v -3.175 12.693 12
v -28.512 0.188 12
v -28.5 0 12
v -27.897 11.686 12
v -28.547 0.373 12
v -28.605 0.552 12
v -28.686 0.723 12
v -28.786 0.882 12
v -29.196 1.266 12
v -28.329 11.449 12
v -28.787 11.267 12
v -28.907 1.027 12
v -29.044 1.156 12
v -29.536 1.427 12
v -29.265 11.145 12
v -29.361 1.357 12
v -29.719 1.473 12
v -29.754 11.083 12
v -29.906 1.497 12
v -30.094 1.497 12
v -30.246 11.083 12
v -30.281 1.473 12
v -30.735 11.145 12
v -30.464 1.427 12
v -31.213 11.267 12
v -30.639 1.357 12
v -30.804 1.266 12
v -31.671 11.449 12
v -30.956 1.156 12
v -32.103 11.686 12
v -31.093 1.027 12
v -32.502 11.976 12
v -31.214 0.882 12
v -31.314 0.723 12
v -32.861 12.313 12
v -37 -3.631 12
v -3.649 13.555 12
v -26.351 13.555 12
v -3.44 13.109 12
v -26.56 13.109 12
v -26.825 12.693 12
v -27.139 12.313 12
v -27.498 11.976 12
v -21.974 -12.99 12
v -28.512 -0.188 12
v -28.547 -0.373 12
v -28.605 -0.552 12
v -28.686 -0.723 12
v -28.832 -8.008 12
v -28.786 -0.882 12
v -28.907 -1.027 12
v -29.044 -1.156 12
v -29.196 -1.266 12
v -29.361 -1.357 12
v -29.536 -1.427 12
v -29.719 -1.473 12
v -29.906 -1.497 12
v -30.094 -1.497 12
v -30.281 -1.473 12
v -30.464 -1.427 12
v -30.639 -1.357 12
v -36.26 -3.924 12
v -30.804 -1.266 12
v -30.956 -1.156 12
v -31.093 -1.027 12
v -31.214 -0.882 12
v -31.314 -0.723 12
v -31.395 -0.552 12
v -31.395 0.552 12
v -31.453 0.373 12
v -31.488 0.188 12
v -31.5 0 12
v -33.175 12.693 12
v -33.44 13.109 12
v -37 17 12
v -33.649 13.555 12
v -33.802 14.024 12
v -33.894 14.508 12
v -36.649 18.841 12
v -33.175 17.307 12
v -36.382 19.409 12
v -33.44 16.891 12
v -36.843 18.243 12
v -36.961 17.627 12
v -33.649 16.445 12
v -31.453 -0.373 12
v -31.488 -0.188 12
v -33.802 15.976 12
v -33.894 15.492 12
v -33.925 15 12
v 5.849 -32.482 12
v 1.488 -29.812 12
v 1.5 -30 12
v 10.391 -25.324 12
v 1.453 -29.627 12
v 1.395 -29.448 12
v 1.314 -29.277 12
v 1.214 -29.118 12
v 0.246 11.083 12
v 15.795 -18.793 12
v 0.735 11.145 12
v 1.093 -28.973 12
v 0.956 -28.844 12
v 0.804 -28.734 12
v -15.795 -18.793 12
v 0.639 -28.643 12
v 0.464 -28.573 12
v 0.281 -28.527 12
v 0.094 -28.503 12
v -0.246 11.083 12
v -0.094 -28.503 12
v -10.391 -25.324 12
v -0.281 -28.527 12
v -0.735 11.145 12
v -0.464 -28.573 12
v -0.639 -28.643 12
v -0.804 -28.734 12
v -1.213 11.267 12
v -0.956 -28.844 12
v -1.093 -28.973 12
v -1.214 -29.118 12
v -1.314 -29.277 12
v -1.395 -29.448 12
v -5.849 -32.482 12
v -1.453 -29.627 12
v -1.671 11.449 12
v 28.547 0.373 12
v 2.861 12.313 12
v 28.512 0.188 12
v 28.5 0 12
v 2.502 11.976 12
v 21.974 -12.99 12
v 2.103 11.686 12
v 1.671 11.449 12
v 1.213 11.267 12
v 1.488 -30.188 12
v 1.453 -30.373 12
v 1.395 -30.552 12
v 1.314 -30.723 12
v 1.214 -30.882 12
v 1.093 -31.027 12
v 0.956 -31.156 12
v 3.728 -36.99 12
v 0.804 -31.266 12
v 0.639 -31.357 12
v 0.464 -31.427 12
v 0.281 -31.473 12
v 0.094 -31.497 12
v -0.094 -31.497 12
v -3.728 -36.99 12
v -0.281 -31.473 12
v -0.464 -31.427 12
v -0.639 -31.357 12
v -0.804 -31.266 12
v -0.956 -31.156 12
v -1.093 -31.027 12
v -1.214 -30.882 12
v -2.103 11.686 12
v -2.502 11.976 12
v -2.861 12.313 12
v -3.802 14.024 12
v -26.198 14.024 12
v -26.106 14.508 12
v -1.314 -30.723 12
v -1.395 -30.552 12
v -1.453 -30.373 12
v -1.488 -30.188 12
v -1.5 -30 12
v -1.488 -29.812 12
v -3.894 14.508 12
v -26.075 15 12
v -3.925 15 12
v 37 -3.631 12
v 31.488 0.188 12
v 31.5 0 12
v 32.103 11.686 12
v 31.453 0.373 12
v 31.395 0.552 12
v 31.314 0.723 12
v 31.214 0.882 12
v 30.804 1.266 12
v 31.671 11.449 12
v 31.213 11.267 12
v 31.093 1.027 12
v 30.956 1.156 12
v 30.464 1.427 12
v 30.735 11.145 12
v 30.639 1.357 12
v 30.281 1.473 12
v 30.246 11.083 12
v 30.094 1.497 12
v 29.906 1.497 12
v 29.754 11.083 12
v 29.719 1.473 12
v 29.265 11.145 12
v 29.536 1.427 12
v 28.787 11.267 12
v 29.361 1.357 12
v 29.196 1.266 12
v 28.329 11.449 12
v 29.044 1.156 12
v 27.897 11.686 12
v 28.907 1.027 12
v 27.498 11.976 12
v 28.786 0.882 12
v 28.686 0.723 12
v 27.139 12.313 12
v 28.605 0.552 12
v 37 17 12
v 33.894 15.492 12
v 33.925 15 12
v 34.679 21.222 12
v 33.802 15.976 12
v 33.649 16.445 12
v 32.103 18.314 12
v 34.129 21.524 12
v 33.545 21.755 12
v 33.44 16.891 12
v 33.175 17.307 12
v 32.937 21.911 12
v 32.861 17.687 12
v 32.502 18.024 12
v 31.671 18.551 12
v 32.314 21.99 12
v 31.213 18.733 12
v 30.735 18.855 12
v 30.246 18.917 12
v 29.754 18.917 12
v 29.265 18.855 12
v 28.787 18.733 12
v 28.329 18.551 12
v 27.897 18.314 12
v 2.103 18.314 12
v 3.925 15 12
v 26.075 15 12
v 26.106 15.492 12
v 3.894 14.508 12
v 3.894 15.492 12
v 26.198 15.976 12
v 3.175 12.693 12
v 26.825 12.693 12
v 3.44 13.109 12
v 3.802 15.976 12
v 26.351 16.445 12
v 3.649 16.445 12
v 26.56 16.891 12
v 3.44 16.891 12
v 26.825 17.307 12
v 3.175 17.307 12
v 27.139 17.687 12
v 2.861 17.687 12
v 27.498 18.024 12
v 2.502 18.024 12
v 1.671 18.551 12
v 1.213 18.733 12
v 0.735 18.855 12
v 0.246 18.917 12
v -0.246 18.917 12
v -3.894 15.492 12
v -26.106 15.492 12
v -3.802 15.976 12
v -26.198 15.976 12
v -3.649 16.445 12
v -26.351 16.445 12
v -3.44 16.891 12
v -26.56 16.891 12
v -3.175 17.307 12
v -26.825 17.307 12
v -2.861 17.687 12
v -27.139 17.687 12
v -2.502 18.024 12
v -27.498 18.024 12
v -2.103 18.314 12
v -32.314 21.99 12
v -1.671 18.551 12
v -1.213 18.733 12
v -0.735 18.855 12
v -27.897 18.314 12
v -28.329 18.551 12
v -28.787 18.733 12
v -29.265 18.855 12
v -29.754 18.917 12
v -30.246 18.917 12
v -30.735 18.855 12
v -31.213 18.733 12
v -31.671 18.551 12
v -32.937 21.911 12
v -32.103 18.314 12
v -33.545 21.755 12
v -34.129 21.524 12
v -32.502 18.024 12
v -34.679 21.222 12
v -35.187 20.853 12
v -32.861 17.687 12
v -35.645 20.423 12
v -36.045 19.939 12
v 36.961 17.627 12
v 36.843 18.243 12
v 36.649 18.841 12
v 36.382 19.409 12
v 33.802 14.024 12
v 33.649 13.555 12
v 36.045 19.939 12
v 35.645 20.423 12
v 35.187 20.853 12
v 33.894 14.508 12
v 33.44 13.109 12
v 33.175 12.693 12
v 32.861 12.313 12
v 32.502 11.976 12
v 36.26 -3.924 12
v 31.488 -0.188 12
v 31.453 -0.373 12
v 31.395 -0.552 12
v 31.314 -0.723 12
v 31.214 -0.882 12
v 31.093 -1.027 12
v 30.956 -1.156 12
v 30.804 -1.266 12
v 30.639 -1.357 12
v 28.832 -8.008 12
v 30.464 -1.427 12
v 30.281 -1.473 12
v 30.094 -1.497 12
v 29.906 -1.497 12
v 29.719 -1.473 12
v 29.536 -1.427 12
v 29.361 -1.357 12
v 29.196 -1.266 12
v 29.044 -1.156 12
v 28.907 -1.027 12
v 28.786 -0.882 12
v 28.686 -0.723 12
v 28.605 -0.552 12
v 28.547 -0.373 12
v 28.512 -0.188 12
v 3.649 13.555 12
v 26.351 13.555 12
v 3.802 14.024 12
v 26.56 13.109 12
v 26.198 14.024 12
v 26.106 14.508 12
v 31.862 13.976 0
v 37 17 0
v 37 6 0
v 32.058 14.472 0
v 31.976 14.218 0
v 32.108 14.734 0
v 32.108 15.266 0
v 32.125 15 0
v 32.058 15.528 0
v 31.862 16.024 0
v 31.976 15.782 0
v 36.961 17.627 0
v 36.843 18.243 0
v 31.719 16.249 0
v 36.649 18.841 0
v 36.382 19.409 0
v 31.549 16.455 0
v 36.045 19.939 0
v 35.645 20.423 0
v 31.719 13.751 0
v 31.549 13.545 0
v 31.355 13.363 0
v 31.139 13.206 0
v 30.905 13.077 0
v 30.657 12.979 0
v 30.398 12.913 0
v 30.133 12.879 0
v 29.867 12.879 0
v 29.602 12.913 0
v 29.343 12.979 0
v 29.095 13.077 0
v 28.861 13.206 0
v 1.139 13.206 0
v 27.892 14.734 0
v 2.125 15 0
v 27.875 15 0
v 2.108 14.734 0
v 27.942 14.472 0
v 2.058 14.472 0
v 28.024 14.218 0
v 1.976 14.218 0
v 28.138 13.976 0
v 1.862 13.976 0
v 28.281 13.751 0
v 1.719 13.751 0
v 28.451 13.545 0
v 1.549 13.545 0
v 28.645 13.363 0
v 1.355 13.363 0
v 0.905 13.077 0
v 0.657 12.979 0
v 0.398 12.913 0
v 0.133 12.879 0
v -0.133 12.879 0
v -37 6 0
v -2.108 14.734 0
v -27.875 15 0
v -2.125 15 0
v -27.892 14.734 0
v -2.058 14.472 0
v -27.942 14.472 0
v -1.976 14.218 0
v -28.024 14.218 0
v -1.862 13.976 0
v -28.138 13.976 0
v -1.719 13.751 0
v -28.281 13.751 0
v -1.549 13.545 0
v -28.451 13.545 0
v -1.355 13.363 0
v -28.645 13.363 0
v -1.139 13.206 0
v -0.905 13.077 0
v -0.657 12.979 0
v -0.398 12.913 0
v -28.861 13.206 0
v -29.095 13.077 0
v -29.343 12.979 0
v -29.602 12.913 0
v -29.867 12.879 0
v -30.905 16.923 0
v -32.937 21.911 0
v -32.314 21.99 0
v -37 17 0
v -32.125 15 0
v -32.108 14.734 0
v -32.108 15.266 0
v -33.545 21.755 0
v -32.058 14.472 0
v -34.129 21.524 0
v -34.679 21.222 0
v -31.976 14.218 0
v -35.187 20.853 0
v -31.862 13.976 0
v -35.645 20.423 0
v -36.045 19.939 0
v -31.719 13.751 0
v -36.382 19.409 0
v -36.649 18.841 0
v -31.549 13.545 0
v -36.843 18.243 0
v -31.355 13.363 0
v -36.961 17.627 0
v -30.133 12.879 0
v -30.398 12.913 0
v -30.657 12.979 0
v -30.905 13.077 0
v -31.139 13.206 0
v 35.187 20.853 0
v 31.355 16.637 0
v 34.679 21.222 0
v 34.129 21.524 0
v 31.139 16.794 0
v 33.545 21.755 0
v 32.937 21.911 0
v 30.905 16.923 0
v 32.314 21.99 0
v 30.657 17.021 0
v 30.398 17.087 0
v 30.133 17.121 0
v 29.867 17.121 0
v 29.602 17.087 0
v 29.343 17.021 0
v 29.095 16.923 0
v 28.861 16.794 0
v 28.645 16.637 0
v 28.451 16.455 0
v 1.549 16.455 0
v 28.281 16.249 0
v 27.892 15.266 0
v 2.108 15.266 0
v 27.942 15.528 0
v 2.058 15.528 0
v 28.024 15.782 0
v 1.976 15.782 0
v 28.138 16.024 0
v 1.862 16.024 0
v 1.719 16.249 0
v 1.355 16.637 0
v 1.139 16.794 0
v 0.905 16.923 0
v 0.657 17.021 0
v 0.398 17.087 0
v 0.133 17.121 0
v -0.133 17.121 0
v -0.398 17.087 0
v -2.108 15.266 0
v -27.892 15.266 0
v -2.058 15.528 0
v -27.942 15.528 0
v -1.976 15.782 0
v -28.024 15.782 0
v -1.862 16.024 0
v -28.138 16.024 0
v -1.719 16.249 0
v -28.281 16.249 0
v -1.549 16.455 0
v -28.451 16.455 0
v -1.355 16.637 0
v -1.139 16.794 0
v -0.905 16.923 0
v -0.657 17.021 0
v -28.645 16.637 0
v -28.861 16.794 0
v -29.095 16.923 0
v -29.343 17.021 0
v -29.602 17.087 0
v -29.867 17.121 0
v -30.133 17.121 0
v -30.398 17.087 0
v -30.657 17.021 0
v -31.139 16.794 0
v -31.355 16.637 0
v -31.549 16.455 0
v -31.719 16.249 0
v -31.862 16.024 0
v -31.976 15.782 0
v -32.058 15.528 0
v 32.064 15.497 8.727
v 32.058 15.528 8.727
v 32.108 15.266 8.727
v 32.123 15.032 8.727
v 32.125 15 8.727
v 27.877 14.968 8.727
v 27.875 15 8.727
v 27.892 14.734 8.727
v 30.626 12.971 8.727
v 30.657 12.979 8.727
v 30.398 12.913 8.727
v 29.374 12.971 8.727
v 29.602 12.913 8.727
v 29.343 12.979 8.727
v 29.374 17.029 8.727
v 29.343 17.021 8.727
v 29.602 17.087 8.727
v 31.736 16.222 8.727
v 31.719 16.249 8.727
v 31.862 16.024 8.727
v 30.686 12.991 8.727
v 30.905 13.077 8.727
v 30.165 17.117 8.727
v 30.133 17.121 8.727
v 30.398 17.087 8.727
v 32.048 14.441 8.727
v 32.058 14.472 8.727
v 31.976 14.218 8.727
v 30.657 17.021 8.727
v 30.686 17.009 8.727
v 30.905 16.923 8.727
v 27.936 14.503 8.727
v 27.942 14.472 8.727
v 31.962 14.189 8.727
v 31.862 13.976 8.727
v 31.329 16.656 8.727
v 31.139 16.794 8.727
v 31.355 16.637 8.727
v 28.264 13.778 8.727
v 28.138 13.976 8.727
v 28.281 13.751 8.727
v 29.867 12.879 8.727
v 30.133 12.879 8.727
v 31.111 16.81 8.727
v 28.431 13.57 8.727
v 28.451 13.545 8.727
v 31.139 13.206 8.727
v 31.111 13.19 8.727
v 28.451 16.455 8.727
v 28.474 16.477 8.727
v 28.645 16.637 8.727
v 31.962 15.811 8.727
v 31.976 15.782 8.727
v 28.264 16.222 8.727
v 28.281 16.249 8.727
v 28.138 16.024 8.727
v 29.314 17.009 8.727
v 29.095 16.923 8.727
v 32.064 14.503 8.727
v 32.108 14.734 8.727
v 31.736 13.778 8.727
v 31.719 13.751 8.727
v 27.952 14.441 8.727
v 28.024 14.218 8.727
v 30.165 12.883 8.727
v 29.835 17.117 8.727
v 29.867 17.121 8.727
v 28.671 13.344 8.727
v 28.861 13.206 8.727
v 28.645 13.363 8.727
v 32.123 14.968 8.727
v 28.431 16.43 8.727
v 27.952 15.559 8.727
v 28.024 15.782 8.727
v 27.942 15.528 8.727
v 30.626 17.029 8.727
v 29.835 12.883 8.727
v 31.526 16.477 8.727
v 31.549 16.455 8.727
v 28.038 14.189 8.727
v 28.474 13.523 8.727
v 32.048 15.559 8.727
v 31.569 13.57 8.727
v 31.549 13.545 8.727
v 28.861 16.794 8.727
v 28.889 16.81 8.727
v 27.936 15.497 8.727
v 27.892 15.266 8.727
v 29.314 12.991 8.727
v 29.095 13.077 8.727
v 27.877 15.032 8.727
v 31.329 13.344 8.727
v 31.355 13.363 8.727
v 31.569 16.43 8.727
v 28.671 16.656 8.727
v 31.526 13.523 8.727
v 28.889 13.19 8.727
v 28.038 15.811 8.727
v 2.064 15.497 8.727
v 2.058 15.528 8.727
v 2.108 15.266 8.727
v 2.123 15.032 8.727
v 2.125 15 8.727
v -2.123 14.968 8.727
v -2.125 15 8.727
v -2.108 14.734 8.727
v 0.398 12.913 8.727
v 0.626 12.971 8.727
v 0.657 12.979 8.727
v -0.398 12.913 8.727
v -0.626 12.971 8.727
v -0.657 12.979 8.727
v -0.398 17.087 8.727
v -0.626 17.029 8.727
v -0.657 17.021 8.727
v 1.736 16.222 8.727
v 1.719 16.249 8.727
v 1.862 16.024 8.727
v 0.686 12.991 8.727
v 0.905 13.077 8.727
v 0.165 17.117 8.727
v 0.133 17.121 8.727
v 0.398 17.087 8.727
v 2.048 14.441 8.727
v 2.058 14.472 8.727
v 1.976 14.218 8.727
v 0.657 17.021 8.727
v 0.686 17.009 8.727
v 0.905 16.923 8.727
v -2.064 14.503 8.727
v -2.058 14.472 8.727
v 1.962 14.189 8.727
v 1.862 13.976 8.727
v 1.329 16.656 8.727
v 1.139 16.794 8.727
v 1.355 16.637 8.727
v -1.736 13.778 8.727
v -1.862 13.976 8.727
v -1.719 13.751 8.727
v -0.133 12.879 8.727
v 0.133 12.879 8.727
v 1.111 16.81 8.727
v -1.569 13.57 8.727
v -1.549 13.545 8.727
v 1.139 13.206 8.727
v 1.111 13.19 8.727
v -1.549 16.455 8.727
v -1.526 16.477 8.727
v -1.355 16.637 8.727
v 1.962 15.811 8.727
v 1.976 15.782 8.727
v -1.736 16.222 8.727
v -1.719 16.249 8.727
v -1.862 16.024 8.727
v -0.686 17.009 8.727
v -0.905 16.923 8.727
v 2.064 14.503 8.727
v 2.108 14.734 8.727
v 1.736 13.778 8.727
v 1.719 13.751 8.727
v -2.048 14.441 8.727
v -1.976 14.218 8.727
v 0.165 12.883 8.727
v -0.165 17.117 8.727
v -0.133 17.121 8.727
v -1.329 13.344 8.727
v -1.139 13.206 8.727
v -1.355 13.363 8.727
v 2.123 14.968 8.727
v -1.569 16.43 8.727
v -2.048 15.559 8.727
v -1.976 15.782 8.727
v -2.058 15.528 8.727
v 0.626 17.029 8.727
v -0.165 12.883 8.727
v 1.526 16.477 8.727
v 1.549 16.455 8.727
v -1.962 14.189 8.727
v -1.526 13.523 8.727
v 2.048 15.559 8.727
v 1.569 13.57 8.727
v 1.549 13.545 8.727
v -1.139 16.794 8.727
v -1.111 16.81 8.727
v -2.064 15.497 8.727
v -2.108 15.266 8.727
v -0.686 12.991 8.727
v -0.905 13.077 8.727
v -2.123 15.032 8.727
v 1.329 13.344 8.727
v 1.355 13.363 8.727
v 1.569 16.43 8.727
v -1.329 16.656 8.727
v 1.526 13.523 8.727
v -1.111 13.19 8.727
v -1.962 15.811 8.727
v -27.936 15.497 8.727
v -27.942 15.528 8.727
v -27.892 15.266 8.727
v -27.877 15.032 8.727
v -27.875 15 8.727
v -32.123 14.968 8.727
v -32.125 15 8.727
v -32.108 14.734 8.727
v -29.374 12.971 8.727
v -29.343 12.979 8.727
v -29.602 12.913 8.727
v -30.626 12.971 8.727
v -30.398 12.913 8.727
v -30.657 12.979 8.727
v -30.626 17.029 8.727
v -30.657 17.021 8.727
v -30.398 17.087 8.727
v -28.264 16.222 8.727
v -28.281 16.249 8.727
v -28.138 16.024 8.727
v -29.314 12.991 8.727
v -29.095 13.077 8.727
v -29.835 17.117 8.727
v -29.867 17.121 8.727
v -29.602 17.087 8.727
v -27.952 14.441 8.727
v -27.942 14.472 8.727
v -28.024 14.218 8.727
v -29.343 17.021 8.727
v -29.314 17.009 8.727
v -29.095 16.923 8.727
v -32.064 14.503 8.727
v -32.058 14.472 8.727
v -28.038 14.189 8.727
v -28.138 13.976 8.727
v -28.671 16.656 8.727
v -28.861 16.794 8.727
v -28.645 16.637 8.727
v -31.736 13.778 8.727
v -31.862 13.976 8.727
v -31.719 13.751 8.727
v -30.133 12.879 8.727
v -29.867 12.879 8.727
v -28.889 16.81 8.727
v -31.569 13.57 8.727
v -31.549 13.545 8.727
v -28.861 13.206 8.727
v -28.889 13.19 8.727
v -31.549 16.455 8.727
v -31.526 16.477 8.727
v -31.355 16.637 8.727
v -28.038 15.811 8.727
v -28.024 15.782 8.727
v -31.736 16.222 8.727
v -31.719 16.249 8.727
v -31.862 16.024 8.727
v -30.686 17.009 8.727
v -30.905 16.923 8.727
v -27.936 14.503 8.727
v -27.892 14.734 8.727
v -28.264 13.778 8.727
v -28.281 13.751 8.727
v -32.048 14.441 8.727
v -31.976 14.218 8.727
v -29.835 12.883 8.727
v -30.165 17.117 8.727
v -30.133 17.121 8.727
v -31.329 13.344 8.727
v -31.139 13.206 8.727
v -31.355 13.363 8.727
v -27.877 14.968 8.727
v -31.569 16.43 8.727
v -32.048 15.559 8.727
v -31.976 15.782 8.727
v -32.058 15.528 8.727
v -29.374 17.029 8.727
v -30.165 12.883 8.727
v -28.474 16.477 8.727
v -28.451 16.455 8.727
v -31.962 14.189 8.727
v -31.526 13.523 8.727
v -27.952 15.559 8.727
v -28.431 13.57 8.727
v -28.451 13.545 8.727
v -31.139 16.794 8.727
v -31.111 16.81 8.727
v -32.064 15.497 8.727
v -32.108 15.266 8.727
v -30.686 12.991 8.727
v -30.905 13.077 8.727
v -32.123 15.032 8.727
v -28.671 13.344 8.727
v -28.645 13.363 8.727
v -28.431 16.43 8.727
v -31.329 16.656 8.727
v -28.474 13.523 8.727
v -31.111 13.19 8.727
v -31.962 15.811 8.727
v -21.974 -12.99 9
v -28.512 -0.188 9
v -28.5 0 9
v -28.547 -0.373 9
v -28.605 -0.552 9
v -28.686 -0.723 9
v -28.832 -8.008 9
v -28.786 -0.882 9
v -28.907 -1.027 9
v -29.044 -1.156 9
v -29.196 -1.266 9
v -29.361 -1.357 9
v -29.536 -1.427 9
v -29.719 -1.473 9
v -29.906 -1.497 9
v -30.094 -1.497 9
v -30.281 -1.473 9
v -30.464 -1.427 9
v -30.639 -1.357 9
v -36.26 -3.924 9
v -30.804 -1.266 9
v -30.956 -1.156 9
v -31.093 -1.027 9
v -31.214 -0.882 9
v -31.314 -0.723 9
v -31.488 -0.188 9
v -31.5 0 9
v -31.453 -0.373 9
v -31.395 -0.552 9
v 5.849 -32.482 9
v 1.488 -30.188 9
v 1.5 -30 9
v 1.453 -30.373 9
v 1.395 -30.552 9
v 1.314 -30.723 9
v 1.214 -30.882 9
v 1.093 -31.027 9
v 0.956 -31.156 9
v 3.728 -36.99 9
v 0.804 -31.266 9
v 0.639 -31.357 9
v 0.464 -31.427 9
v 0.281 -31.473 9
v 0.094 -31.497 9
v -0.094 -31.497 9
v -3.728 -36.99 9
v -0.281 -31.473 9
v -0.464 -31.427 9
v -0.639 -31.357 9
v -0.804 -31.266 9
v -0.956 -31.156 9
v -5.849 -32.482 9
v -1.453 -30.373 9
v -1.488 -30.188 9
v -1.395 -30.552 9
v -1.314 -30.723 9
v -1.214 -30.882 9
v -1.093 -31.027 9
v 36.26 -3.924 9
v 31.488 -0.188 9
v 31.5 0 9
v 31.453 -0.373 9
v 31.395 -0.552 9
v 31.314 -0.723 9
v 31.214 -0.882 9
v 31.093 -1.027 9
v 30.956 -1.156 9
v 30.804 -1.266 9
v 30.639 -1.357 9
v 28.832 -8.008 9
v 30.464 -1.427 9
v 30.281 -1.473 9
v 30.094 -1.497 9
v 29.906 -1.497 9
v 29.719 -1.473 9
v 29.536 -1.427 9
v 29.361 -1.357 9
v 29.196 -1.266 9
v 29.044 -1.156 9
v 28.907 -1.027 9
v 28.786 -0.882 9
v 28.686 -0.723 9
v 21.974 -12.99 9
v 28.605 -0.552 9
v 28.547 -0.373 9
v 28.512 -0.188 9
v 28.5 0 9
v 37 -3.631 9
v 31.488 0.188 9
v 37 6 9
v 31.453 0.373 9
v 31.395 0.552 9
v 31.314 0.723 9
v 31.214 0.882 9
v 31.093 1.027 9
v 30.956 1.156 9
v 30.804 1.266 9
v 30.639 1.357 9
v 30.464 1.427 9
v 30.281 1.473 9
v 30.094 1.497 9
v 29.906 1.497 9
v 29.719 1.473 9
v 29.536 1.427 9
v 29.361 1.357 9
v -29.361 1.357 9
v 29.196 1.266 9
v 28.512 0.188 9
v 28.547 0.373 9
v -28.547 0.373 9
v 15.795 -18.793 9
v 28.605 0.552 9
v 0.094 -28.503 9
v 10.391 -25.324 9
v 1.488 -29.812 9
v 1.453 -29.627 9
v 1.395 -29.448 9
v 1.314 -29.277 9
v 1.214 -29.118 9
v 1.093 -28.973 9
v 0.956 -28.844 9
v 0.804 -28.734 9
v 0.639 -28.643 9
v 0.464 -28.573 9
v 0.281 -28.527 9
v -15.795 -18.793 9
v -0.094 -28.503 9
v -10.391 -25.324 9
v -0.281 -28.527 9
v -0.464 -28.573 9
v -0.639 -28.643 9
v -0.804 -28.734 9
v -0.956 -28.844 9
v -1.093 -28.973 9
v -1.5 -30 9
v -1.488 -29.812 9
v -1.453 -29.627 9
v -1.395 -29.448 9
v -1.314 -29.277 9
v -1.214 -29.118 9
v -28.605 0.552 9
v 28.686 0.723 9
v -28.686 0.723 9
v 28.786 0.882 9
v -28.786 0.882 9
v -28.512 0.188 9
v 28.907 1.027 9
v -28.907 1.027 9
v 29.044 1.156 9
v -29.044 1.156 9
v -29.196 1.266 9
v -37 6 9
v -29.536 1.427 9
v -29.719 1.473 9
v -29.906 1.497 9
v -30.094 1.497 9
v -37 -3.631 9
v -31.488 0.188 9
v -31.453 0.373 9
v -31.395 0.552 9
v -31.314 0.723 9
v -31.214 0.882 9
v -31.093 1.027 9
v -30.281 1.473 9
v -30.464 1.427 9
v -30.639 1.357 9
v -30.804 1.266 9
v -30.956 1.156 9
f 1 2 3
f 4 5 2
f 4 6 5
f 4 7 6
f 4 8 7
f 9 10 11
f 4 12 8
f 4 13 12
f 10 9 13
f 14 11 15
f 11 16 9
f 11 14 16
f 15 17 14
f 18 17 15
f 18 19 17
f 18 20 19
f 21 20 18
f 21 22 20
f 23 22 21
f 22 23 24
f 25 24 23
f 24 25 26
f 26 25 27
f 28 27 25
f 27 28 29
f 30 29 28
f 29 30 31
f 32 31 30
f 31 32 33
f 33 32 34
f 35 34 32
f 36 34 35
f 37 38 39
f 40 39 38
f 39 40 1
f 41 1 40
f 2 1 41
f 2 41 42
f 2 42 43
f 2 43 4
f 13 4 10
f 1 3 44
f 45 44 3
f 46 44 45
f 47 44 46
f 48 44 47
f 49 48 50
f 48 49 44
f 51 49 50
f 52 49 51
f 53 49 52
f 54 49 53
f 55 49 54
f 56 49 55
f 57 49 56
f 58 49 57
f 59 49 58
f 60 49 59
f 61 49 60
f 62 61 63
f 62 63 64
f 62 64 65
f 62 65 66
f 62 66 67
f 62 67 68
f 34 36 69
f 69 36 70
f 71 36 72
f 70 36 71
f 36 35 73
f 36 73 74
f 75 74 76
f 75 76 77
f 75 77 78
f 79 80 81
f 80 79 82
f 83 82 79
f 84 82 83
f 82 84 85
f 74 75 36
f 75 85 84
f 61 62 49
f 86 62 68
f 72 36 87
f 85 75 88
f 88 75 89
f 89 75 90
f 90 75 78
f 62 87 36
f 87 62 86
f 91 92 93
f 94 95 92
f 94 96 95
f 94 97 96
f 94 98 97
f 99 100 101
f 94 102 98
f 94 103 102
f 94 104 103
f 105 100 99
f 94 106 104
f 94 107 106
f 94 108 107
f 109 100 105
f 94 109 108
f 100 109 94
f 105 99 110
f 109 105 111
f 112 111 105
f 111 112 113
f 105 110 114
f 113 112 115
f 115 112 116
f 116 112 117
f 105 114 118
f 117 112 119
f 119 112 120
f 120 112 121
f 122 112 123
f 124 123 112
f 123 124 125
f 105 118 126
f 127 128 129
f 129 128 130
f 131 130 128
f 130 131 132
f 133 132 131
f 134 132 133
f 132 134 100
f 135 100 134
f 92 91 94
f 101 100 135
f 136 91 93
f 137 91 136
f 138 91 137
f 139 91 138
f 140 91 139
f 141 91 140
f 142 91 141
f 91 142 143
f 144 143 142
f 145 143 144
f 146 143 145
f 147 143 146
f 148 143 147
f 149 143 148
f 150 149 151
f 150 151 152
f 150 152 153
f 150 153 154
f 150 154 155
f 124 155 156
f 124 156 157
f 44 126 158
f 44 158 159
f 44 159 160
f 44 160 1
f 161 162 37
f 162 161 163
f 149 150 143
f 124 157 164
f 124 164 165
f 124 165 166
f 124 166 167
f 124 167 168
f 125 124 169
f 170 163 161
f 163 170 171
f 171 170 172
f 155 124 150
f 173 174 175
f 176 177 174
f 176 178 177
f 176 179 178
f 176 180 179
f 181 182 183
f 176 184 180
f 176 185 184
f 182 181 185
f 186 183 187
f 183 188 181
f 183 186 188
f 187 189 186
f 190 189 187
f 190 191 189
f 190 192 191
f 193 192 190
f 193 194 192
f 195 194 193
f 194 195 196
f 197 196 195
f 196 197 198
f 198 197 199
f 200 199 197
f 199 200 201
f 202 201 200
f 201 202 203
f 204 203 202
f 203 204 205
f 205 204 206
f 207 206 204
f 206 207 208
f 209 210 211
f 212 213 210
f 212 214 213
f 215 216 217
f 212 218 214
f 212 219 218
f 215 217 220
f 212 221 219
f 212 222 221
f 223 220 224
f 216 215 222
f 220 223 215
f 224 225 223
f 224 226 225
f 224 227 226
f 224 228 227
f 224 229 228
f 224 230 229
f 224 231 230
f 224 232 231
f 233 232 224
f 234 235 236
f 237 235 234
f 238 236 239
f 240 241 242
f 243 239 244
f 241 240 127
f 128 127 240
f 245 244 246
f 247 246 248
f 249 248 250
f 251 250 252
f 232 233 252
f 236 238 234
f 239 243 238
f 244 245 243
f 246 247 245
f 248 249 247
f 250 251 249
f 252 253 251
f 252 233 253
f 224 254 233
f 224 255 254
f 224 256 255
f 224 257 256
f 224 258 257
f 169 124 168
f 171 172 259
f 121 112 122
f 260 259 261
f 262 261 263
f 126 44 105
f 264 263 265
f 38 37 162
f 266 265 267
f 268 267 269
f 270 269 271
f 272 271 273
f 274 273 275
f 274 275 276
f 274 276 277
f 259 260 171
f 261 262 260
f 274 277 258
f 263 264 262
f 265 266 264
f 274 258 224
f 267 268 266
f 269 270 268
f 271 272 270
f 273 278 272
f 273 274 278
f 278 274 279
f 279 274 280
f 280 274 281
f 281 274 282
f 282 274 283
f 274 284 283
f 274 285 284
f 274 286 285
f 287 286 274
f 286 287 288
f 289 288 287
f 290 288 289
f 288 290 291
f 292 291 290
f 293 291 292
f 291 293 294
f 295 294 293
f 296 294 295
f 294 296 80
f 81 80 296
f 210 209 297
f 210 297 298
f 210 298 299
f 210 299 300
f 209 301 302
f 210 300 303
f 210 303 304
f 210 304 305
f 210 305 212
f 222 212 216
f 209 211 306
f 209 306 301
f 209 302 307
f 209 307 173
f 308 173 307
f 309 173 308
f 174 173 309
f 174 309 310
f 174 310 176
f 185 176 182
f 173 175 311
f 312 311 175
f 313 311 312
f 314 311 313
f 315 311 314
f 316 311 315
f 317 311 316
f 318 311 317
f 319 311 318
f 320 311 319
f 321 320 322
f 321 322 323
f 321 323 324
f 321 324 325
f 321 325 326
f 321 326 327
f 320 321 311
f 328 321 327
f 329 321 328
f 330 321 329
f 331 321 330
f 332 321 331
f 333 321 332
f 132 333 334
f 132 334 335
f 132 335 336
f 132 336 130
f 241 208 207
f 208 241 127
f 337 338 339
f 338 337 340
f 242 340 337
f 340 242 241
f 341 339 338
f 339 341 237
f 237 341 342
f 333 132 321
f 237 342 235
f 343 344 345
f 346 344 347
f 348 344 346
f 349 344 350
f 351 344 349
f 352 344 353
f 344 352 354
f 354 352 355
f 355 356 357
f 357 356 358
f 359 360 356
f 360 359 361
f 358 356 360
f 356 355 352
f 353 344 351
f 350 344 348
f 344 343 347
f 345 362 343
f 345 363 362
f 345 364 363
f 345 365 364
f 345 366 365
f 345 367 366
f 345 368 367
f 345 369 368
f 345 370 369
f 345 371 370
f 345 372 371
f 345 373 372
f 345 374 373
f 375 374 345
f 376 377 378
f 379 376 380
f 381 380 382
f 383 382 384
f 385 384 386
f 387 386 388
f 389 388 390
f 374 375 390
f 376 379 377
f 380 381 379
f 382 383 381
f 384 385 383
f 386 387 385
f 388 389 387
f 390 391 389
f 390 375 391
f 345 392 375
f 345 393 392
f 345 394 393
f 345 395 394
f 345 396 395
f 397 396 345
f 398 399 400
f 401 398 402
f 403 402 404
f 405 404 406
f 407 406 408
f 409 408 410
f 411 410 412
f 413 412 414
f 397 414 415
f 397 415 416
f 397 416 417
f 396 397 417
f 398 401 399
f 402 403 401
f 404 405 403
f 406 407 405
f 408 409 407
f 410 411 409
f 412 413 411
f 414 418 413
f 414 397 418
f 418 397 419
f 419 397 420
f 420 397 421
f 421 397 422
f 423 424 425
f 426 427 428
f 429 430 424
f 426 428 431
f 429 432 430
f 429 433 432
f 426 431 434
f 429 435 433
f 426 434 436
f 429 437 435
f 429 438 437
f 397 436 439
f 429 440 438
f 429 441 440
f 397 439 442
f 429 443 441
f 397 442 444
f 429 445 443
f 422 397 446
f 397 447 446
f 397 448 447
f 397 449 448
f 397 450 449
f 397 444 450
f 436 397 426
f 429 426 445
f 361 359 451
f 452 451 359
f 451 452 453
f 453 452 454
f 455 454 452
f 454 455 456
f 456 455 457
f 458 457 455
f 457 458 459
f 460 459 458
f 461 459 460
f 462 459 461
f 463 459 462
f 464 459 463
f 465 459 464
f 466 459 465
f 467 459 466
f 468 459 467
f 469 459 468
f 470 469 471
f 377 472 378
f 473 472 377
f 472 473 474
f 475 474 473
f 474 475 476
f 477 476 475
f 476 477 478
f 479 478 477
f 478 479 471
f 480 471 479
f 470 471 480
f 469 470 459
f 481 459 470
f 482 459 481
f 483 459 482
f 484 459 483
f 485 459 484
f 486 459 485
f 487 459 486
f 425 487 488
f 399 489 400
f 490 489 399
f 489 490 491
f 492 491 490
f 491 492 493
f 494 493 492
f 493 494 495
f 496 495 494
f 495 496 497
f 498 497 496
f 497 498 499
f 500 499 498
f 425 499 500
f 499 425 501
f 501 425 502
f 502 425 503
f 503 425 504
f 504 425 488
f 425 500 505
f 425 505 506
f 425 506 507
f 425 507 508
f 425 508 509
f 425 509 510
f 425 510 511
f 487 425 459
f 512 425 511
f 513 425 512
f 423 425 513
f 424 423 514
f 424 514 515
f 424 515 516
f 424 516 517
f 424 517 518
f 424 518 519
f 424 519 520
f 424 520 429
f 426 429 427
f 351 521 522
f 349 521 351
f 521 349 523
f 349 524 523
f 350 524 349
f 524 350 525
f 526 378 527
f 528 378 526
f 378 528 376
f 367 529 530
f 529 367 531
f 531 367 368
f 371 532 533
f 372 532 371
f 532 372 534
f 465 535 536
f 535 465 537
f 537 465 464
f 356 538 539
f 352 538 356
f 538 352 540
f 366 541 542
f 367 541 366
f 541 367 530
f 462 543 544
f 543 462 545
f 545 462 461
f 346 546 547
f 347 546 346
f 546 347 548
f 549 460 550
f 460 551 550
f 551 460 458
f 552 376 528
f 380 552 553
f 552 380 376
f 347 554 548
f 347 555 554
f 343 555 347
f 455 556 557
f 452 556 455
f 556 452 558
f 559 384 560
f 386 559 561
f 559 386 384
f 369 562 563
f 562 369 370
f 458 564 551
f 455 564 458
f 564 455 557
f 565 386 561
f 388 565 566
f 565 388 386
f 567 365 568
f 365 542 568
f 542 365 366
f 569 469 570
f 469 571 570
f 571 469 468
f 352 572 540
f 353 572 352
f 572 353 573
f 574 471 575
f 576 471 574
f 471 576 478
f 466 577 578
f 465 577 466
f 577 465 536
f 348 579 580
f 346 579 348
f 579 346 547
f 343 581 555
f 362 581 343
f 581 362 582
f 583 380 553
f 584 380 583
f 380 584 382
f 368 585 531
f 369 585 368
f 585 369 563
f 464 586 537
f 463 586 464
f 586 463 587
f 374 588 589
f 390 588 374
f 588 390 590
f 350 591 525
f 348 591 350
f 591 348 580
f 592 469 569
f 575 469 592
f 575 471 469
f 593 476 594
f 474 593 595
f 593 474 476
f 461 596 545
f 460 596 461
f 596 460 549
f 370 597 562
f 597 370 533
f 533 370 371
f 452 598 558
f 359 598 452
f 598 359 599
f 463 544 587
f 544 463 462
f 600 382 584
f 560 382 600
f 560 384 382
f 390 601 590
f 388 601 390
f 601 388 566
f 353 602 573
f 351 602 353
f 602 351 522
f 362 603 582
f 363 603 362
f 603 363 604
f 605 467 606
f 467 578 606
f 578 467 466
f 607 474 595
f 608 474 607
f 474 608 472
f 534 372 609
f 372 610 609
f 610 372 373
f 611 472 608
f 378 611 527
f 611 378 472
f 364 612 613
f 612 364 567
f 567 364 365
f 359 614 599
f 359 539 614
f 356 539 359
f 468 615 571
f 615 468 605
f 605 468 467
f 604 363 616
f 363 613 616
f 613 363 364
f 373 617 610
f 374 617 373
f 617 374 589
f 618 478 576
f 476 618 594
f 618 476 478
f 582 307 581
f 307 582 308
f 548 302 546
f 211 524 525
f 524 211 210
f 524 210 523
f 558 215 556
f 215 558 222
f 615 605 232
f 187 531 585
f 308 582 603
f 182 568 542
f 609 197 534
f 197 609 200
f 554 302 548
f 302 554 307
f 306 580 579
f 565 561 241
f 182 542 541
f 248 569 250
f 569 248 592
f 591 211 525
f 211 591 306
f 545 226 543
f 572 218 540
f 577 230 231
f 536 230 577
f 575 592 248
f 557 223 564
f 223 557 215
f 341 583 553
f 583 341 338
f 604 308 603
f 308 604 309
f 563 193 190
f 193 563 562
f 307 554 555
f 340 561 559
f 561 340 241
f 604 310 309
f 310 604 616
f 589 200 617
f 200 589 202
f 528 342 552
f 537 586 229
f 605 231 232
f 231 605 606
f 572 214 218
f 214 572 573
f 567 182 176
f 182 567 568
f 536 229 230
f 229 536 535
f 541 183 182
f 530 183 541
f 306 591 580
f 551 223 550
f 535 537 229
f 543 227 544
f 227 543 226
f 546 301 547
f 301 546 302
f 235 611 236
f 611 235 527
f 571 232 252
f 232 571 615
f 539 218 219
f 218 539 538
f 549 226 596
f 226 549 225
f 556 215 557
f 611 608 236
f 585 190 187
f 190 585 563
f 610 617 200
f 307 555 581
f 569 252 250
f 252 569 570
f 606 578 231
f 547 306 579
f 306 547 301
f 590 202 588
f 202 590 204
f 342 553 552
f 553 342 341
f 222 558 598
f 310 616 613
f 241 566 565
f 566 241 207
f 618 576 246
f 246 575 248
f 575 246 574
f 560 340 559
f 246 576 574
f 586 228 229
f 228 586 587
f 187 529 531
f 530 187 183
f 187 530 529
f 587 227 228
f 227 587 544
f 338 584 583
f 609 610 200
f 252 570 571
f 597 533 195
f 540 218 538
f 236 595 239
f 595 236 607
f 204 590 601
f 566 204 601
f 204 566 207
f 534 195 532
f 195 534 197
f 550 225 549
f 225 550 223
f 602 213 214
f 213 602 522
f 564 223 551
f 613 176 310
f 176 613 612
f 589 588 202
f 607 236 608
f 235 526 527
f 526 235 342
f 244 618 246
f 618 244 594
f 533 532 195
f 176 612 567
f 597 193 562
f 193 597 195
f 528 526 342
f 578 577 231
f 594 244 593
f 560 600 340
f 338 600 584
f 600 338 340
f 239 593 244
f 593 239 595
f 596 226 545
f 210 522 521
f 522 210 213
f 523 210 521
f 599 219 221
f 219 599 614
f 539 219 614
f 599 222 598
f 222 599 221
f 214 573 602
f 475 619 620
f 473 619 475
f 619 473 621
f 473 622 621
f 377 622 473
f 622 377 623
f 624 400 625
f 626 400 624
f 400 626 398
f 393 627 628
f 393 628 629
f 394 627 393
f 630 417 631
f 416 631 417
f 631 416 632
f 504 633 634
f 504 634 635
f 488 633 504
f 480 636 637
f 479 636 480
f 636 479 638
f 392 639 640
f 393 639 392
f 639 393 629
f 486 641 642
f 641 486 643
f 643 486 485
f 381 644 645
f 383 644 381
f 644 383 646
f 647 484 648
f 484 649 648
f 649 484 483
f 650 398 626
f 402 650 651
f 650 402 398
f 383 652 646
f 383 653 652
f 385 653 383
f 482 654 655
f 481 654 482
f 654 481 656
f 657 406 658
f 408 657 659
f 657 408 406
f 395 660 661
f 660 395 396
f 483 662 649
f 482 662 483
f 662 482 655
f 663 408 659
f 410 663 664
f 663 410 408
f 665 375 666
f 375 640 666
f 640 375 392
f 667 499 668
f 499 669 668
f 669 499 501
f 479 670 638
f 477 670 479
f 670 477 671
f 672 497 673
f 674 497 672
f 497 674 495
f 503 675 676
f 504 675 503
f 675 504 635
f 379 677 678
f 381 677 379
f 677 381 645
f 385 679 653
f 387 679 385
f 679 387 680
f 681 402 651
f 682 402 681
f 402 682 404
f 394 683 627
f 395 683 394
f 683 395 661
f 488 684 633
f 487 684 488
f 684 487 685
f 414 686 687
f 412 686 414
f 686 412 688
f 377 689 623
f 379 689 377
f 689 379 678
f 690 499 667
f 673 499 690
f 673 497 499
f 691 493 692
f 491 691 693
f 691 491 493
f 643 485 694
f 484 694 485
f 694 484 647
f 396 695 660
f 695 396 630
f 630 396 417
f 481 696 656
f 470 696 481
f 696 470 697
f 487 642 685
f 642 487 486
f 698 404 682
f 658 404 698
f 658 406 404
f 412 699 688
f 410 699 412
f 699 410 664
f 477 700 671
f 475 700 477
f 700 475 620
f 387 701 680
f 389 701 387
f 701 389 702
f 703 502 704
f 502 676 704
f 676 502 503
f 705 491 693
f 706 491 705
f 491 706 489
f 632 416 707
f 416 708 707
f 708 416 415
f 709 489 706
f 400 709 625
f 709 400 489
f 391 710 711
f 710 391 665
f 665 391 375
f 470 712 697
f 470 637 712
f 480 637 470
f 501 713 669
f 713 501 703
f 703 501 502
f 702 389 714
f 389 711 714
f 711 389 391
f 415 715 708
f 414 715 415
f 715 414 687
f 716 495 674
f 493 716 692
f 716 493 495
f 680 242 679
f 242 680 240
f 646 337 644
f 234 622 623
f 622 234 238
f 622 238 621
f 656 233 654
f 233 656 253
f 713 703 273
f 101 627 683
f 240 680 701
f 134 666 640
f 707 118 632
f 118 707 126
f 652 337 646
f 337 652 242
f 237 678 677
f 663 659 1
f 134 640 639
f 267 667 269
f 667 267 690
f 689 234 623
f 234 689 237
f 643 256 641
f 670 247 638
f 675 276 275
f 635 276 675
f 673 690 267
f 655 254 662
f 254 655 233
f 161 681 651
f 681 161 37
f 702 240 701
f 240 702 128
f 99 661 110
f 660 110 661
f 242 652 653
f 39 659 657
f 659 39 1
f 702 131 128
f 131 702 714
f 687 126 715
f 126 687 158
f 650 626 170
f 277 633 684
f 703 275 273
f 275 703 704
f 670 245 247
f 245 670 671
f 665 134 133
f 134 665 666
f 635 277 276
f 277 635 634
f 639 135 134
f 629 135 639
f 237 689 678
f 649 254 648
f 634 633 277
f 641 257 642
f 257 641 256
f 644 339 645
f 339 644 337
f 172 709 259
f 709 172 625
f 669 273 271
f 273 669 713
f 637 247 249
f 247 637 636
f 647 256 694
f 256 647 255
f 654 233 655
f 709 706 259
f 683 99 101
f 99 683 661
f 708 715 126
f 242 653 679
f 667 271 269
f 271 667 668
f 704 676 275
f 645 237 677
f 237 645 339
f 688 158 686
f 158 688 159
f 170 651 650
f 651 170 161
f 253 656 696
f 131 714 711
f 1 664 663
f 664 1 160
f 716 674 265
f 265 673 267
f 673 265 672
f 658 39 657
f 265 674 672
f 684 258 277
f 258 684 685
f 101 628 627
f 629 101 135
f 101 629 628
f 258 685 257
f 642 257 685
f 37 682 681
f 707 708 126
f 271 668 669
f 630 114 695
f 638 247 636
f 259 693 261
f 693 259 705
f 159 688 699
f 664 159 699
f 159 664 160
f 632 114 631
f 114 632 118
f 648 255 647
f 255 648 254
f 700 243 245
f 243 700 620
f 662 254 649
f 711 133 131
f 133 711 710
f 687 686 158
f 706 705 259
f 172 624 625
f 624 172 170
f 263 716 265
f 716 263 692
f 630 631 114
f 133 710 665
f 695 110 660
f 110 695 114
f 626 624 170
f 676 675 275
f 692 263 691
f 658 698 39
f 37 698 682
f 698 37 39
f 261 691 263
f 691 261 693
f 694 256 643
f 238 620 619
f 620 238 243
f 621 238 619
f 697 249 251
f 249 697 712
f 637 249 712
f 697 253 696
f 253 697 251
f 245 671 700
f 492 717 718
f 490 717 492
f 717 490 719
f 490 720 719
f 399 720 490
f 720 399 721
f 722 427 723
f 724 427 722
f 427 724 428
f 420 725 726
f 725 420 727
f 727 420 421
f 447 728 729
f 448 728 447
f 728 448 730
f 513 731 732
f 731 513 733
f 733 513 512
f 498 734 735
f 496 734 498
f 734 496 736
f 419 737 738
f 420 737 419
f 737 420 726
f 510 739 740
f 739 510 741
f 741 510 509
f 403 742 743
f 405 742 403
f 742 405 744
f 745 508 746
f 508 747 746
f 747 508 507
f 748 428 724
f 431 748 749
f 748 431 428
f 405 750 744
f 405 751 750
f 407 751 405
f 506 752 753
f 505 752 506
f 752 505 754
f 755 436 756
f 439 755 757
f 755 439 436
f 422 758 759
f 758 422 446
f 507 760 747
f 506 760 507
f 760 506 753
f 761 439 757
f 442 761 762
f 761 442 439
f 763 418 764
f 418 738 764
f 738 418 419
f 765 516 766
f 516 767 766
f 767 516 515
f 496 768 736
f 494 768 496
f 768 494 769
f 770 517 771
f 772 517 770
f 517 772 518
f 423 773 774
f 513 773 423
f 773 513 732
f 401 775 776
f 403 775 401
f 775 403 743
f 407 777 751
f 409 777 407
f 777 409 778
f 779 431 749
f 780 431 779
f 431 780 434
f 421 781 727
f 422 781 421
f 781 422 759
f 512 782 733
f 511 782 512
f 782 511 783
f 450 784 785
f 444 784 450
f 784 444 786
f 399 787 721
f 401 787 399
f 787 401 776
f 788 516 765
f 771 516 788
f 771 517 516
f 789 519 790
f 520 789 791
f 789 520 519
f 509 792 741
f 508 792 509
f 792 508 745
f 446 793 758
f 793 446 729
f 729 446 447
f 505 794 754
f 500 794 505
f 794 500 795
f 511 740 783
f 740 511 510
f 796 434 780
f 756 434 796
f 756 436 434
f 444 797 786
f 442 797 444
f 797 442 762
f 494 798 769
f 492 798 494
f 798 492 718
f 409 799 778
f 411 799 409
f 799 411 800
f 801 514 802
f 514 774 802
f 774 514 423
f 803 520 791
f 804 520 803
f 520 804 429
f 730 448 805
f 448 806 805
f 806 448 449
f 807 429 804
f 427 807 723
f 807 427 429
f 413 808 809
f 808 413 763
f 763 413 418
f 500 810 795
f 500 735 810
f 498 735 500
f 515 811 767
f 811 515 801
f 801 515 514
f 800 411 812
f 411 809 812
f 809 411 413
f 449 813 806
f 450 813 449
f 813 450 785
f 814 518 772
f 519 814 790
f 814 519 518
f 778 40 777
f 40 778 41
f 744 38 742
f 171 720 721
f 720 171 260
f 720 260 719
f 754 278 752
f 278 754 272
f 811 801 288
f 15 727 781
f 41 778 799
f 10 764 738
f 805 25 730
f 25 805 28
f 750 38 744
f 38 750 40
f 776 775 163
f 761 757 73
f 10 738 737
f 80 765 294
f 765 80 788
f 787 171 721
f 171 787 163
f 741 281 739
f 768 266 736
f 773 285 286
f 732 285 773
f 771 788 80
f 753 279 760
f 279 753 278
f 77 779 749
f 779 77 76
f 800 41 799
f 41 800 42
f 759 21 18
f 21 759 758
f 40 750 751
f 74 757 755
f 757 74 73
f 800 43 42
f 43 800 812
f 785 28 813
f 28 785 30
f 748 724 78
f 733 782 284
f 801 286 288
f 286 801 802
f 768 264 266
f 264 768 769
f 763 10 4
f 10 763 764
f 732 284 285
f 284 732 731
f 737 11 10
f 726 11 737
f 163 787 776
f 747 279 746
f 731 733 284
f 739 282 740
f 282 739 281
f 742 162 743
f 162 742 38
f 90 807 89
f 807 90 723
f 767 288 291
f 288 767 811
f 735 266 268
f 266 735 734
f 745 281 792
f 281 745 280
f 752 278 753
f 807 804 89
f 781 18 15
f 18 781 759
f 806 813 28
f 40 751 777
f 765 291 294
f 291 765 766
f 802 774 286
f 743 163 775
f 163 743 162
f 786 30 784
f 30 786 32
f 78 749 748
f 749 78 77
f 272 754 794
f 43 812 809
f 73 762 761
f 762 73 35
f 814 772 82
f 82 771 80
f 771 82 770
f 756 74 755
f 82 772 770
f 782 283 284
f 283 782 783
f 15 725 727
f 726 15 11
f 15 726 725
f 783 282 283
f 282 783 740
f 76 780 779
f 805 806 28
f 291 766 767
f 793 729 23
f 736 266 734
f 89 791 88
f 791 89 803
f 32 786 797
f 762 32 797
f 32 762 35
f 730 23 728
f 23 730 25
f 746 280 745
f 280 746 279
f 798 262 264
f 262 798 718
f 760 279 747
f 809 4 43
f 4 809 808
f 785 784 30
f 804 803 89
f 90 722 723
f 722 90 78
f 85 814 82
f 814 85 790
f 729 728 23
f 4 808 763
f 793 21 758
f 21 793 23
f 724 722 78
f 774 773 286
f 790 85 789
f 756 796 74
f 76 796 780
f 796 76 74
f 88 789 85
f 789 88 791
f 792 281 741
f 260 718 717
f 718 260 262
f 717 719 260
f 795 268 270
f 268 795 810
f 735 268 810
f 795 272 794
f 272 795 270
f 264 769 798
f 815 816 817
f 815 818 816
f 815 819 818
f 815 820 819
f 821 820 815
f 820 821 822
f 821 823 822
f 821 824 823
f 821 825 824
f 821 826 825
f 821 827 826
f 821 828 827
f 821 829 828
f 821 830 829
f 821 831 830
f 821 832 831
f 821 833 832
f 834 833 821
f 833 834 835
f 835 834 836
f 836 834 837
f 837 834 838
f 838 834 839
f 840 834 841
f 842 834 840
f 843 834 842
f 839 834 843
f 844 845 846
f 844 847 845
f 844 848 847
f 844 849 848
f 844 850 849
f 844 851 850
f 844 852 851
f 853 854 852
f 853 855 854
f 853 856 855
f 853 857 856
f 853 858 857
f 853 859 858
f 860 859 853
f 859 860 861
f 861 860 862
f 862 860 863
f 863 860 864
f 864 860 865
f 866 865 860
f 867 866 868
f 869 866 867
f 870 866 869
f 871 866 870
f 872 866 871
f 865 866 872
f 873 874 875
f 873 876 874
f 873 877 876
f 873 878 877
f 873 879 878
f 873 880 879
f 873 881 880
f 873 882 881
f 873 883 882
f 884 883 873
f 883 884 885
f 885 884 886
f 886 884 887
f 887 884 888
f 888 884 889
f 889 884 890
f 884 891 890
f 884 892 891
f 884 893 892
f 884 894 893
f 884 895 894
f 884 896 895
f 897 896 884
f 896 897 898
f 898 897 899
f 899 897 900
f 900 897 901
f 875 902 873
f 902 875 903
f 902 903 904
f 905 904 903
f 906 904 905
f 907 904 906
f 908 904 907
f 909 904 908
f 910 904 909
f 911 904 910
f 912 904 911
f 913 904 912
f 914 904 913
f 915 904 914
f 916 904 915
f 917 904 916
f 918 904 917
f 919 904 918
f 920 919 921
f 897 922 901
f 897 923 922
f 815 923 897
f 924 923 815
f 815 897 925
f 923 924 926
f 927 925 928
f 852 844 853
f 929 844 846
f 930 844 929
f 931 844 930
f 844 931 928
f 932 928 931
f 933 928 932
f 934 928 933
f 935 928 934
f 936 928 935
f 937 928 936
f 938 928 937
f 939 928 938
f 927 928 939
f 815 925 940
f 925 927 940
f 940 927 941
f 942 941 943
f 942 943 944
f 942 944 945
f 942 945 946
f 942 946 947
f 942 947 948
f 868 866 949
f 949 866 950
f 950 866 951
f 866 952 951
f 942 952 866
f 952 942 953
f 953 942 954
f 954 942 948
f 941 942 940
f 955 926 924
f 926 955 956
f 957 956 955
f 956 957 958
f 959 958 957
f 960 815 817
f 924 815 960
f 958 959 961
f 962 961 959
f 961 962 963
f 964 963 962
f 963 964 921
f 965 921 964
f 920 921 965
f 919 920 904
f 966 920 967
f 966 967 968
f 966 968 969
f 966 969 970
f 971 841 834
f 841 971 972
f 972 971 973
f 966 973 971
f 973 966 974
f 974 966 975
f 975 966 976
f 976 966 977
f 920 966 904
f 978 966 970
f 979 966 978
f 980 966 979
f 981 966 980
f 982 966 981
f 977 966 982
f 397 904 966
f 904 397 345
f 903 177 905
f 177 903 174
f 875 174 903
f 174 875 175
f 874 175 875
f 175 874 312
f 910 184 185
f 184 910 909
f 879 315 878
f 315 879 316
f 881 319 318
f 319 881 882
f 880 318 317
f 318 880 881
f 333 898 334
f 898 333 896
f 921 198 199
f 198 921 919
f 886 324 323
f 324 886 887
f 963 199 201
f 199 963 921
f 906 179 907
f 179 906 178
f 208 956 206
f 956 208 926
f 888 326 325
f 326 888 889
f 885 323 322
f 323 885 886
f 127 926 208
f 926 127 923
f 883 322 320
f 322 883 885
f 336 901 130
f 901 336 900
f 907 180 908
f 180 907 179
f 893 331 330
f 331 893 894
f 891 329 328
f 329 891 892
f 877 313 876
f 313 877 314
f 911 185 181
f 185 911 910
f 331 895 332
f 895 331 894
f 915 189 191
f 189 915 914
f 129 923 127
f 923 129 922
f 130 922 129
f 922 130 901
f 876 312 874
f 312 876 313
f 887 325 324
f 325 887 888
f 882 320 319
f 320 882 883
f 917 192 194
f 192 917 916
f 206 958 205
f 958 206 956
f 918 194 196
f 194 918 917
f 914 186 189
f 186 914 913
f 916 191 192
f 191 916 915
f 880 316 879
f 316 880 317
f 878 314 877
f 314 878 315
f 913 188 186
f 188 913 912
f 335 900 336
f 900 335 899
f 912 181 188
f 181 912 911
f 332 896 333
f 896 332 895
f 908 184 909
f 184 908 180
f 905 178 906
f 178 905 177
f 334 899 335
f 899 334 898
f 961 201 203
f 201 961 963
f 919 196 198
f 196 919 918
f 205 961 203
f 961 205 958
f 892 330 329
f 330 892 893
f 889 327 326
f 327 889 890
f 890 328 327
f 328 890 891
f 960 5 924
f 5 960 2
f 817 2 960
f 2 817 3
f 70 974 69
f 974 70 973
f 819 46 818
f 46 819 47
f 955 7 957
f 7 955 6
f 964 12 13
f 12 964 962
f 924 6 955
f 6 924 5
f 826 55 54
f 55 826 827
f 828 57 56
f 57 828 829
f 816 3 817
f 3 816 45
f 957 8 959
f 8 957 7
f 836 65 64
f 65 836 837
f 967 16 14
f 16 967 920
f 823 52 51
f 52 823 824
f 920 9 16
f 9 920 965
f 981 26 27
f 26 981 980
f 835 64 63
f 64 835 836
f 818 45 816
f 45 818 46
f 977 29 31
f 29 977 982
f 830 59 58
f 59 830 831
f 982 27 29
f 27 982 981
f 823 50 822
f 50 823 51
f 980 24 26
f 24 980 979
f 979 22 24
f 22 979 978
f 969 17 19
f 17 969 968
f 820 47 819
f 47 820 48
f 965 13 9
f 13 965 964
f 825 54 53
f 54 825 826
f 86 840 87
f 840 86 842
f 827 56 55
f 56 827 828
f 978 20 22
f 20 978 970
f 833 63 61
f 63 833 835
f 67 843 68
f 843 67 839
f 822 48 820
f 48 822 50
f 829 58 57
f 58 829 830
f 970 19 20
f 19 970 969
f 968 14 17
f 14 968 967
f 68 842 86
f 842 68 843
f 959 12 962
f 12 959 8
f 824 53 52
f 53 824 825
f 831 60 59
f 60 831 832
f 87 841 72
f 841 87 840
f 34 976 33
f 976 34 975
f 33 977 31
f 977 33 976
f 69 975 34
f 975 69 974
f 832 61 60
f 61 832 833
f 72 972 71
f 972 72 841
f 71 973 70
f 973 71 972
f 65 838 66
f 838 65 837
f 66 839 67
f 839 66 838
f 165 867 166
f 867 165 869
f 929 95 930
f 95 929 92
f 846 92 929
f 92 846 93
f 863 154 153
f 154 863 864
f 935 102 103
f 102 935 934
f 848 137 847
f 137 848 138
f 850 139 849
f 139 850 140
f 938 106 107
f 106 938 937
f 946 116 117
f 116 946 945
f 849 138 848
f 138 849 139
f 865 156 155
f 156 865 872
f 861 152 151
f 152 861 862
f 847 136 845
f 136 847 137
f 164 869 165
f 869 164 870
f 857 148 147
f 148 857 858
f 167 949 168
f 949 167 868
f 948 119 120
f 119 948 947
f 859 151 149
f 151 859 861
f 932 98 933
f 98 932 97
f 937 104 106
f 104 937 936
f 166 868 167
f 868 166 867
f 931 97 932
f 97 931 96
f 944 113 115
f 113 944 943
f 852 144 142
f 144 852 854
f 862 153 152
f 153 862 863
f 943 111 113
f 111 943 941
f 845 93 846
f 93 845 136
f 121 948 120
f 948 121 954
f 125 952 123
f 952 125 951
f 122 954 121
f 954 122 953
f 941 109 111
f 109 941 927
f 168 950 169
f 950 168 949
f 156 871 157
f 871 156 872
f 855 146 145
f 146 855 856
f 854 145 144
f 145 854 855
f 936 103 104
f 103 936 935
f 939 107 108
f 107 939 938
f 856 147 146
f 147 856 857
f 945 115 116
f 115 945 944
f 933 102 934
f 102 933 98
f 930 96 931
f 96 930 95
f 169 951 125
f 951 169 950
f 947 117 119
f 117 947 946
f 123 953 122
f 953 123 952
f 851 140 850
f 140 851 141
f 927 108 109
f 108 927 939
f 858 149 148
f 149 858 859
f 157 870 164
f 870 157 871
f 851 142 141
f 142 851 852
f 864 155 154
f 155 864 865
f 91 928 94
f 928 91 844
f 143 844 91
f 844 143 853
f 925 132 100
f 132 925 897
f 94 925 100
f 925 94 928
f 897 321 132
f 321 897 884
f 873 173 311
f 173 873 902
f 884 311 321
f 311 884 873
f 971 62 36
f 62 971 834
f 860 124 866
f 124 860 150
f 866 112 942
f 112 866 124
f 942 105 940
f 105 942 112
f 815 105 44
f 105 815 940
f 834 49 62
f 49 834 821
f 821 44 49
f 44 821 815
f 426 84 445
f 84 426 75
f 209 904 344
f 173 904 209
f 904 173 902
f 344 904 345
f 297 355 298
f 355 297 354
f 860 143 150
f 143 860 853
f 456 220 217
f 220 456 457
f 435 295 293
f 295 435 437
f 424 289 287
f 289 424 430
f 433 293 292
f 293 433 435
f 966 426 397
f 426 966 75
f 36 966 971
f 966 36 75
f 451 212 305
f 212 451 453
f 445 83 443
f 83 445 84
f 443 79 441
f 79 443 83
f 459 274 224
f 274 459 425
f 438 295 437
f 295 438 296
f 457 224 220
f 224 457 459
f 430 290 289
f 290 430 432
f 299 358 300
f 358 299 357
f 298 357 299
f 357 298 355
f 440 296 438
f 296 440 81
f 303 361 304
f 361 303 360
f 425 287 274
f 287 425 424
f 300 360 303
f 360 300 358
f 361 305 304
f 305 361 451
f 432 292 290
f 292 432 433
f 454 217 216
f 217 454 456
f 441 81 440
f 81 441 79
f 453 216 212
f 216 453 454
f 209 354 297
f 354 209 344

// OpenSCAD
$fn = 50;


difference() {
	union() {
		translate(v = [0, -7.5000000000, 0]) {
			hull() {
				translate(v = [-32.0000000000, 24.5000000000, 0]) {
					cylinder(h = 12, r = 5);
				}
				translate(v = [32.0000000000, 24.5000000000, 0]) {
					cylinder(h = 12, r = 5);
				}
				translate(v = [-32.0000000000, -24.5000000000, 0]) {
					cylinder(h = 12, r = 5);
				}
				translate(v = [32.0000000000, -24.5000000000, 0]) {
					cylinder(h = 12, r = 5);
				}
			}
		}
	}
	union() {
		translate(v = [30, 15, 12]) {
			rotate(a = [0, 0, 0]) {
				difference() {
					union() {
						translate(v = [0, 0, -12.0000000000]) {
							cylinder(h = 12, r = 2.0000000000);
						}
						translate(v = [0, 0, -12.0000000000]) {
							cylinder(h = 12, r = 2.1250000000);
						}
						translate(v = [0, 0, -3.5000000000]) {
							cylinder(h = 3.5000000000, r1 = 2.0000000000, r2 = 3.9250000000);
						}
						translate(v = [0, 0, -12.0000000000]) {
							cylinder(h = 12, r = 2.0000000000);
						}
					}
					union();
				}
			}
		}
		translate(v = [0, 15, 12]) {
			rotate(a = [0, 0, 0]) {
				difference() {
					union() {
						translate(v = [0, 0, -12.0000000000]) {
							cylinder(h = 12, r = 2.0000000000);
						}
						translate(v = [0, 0, -12.0000000000]) {
							cylinder(h = 12, r = 2.1250000000);
						}
						translate(v = [0, 0, -3.5000000000]) {
							cylinder(h = 3.5000000000, r1 = 2.0000000000, r2 = 3.9250000000);
						}
						translate(v = [0, 0, -12.0000000000]) {
							cylinder(h = 12, r = 2.0000000000);
						}
					}
					union();
				}
			}
		}
		translate(v = [-30, 15, 12]) {
			rotate(a = [0, 0, 0]) {
				difference() {
					union() {
						translate(v = [0, 0, -12.0000000000]) {
							cylinder(h = 12, r = 2.0000000000);
						}
						translate(v = [0, 0, -12.0000000000]) {
							cylinder(h = 12, r = 2.1250000000);
						}
						translate(v = [0, 0, -3.5000000000]) {
							cylinder(h = 3.5000000000, r1 = 2.0000000000, r2 = 3.9250000000);
						}
						translate(v = [0, 0, -12.0000000000]) {
							cylinder(h = 12, r = 2.0000000000);
						}
					}
					union();
				}
			}
		}
		translate(v = [-250.0000000000, -494, -491]) {
			cube(size = [500, 500, 500]);
		}
		translate(v = [-250.0000000000, -494, -491]) {
			cube(size = [500, 500, 500]);
		}
		translate(v = [-250.0000000000, -494, -491]) {
			cube(size = [500, 500, 500]);
		}
		translate(v = [30, 0, -100.0000000000]) {
			cylinder(h = 200, r = 1.5000000000);
		}
		translate(v = [-30, 0, -100.0000000000]) {
			cylinder(h = 200, r = 1.5000000000);
		}
		translate(v = [0, -30, -100.0000000000]) {
			cylinder(h = 200, r = 1.5000000000);
		}
		translate(v = [0, 30, -100.0000000000]) {
			cylinder(h = 200, r = 1.5000000000);
		}
		translate(v = [65, -65, 0.0000000000]) {
			cylinder(h = 12, r = 67.5000000000);
		}
		translate(v = [-65, -65, 0.0000000000]) {
			cylinder(h = 12, r = 67.5000000000);
		}
	}
}
